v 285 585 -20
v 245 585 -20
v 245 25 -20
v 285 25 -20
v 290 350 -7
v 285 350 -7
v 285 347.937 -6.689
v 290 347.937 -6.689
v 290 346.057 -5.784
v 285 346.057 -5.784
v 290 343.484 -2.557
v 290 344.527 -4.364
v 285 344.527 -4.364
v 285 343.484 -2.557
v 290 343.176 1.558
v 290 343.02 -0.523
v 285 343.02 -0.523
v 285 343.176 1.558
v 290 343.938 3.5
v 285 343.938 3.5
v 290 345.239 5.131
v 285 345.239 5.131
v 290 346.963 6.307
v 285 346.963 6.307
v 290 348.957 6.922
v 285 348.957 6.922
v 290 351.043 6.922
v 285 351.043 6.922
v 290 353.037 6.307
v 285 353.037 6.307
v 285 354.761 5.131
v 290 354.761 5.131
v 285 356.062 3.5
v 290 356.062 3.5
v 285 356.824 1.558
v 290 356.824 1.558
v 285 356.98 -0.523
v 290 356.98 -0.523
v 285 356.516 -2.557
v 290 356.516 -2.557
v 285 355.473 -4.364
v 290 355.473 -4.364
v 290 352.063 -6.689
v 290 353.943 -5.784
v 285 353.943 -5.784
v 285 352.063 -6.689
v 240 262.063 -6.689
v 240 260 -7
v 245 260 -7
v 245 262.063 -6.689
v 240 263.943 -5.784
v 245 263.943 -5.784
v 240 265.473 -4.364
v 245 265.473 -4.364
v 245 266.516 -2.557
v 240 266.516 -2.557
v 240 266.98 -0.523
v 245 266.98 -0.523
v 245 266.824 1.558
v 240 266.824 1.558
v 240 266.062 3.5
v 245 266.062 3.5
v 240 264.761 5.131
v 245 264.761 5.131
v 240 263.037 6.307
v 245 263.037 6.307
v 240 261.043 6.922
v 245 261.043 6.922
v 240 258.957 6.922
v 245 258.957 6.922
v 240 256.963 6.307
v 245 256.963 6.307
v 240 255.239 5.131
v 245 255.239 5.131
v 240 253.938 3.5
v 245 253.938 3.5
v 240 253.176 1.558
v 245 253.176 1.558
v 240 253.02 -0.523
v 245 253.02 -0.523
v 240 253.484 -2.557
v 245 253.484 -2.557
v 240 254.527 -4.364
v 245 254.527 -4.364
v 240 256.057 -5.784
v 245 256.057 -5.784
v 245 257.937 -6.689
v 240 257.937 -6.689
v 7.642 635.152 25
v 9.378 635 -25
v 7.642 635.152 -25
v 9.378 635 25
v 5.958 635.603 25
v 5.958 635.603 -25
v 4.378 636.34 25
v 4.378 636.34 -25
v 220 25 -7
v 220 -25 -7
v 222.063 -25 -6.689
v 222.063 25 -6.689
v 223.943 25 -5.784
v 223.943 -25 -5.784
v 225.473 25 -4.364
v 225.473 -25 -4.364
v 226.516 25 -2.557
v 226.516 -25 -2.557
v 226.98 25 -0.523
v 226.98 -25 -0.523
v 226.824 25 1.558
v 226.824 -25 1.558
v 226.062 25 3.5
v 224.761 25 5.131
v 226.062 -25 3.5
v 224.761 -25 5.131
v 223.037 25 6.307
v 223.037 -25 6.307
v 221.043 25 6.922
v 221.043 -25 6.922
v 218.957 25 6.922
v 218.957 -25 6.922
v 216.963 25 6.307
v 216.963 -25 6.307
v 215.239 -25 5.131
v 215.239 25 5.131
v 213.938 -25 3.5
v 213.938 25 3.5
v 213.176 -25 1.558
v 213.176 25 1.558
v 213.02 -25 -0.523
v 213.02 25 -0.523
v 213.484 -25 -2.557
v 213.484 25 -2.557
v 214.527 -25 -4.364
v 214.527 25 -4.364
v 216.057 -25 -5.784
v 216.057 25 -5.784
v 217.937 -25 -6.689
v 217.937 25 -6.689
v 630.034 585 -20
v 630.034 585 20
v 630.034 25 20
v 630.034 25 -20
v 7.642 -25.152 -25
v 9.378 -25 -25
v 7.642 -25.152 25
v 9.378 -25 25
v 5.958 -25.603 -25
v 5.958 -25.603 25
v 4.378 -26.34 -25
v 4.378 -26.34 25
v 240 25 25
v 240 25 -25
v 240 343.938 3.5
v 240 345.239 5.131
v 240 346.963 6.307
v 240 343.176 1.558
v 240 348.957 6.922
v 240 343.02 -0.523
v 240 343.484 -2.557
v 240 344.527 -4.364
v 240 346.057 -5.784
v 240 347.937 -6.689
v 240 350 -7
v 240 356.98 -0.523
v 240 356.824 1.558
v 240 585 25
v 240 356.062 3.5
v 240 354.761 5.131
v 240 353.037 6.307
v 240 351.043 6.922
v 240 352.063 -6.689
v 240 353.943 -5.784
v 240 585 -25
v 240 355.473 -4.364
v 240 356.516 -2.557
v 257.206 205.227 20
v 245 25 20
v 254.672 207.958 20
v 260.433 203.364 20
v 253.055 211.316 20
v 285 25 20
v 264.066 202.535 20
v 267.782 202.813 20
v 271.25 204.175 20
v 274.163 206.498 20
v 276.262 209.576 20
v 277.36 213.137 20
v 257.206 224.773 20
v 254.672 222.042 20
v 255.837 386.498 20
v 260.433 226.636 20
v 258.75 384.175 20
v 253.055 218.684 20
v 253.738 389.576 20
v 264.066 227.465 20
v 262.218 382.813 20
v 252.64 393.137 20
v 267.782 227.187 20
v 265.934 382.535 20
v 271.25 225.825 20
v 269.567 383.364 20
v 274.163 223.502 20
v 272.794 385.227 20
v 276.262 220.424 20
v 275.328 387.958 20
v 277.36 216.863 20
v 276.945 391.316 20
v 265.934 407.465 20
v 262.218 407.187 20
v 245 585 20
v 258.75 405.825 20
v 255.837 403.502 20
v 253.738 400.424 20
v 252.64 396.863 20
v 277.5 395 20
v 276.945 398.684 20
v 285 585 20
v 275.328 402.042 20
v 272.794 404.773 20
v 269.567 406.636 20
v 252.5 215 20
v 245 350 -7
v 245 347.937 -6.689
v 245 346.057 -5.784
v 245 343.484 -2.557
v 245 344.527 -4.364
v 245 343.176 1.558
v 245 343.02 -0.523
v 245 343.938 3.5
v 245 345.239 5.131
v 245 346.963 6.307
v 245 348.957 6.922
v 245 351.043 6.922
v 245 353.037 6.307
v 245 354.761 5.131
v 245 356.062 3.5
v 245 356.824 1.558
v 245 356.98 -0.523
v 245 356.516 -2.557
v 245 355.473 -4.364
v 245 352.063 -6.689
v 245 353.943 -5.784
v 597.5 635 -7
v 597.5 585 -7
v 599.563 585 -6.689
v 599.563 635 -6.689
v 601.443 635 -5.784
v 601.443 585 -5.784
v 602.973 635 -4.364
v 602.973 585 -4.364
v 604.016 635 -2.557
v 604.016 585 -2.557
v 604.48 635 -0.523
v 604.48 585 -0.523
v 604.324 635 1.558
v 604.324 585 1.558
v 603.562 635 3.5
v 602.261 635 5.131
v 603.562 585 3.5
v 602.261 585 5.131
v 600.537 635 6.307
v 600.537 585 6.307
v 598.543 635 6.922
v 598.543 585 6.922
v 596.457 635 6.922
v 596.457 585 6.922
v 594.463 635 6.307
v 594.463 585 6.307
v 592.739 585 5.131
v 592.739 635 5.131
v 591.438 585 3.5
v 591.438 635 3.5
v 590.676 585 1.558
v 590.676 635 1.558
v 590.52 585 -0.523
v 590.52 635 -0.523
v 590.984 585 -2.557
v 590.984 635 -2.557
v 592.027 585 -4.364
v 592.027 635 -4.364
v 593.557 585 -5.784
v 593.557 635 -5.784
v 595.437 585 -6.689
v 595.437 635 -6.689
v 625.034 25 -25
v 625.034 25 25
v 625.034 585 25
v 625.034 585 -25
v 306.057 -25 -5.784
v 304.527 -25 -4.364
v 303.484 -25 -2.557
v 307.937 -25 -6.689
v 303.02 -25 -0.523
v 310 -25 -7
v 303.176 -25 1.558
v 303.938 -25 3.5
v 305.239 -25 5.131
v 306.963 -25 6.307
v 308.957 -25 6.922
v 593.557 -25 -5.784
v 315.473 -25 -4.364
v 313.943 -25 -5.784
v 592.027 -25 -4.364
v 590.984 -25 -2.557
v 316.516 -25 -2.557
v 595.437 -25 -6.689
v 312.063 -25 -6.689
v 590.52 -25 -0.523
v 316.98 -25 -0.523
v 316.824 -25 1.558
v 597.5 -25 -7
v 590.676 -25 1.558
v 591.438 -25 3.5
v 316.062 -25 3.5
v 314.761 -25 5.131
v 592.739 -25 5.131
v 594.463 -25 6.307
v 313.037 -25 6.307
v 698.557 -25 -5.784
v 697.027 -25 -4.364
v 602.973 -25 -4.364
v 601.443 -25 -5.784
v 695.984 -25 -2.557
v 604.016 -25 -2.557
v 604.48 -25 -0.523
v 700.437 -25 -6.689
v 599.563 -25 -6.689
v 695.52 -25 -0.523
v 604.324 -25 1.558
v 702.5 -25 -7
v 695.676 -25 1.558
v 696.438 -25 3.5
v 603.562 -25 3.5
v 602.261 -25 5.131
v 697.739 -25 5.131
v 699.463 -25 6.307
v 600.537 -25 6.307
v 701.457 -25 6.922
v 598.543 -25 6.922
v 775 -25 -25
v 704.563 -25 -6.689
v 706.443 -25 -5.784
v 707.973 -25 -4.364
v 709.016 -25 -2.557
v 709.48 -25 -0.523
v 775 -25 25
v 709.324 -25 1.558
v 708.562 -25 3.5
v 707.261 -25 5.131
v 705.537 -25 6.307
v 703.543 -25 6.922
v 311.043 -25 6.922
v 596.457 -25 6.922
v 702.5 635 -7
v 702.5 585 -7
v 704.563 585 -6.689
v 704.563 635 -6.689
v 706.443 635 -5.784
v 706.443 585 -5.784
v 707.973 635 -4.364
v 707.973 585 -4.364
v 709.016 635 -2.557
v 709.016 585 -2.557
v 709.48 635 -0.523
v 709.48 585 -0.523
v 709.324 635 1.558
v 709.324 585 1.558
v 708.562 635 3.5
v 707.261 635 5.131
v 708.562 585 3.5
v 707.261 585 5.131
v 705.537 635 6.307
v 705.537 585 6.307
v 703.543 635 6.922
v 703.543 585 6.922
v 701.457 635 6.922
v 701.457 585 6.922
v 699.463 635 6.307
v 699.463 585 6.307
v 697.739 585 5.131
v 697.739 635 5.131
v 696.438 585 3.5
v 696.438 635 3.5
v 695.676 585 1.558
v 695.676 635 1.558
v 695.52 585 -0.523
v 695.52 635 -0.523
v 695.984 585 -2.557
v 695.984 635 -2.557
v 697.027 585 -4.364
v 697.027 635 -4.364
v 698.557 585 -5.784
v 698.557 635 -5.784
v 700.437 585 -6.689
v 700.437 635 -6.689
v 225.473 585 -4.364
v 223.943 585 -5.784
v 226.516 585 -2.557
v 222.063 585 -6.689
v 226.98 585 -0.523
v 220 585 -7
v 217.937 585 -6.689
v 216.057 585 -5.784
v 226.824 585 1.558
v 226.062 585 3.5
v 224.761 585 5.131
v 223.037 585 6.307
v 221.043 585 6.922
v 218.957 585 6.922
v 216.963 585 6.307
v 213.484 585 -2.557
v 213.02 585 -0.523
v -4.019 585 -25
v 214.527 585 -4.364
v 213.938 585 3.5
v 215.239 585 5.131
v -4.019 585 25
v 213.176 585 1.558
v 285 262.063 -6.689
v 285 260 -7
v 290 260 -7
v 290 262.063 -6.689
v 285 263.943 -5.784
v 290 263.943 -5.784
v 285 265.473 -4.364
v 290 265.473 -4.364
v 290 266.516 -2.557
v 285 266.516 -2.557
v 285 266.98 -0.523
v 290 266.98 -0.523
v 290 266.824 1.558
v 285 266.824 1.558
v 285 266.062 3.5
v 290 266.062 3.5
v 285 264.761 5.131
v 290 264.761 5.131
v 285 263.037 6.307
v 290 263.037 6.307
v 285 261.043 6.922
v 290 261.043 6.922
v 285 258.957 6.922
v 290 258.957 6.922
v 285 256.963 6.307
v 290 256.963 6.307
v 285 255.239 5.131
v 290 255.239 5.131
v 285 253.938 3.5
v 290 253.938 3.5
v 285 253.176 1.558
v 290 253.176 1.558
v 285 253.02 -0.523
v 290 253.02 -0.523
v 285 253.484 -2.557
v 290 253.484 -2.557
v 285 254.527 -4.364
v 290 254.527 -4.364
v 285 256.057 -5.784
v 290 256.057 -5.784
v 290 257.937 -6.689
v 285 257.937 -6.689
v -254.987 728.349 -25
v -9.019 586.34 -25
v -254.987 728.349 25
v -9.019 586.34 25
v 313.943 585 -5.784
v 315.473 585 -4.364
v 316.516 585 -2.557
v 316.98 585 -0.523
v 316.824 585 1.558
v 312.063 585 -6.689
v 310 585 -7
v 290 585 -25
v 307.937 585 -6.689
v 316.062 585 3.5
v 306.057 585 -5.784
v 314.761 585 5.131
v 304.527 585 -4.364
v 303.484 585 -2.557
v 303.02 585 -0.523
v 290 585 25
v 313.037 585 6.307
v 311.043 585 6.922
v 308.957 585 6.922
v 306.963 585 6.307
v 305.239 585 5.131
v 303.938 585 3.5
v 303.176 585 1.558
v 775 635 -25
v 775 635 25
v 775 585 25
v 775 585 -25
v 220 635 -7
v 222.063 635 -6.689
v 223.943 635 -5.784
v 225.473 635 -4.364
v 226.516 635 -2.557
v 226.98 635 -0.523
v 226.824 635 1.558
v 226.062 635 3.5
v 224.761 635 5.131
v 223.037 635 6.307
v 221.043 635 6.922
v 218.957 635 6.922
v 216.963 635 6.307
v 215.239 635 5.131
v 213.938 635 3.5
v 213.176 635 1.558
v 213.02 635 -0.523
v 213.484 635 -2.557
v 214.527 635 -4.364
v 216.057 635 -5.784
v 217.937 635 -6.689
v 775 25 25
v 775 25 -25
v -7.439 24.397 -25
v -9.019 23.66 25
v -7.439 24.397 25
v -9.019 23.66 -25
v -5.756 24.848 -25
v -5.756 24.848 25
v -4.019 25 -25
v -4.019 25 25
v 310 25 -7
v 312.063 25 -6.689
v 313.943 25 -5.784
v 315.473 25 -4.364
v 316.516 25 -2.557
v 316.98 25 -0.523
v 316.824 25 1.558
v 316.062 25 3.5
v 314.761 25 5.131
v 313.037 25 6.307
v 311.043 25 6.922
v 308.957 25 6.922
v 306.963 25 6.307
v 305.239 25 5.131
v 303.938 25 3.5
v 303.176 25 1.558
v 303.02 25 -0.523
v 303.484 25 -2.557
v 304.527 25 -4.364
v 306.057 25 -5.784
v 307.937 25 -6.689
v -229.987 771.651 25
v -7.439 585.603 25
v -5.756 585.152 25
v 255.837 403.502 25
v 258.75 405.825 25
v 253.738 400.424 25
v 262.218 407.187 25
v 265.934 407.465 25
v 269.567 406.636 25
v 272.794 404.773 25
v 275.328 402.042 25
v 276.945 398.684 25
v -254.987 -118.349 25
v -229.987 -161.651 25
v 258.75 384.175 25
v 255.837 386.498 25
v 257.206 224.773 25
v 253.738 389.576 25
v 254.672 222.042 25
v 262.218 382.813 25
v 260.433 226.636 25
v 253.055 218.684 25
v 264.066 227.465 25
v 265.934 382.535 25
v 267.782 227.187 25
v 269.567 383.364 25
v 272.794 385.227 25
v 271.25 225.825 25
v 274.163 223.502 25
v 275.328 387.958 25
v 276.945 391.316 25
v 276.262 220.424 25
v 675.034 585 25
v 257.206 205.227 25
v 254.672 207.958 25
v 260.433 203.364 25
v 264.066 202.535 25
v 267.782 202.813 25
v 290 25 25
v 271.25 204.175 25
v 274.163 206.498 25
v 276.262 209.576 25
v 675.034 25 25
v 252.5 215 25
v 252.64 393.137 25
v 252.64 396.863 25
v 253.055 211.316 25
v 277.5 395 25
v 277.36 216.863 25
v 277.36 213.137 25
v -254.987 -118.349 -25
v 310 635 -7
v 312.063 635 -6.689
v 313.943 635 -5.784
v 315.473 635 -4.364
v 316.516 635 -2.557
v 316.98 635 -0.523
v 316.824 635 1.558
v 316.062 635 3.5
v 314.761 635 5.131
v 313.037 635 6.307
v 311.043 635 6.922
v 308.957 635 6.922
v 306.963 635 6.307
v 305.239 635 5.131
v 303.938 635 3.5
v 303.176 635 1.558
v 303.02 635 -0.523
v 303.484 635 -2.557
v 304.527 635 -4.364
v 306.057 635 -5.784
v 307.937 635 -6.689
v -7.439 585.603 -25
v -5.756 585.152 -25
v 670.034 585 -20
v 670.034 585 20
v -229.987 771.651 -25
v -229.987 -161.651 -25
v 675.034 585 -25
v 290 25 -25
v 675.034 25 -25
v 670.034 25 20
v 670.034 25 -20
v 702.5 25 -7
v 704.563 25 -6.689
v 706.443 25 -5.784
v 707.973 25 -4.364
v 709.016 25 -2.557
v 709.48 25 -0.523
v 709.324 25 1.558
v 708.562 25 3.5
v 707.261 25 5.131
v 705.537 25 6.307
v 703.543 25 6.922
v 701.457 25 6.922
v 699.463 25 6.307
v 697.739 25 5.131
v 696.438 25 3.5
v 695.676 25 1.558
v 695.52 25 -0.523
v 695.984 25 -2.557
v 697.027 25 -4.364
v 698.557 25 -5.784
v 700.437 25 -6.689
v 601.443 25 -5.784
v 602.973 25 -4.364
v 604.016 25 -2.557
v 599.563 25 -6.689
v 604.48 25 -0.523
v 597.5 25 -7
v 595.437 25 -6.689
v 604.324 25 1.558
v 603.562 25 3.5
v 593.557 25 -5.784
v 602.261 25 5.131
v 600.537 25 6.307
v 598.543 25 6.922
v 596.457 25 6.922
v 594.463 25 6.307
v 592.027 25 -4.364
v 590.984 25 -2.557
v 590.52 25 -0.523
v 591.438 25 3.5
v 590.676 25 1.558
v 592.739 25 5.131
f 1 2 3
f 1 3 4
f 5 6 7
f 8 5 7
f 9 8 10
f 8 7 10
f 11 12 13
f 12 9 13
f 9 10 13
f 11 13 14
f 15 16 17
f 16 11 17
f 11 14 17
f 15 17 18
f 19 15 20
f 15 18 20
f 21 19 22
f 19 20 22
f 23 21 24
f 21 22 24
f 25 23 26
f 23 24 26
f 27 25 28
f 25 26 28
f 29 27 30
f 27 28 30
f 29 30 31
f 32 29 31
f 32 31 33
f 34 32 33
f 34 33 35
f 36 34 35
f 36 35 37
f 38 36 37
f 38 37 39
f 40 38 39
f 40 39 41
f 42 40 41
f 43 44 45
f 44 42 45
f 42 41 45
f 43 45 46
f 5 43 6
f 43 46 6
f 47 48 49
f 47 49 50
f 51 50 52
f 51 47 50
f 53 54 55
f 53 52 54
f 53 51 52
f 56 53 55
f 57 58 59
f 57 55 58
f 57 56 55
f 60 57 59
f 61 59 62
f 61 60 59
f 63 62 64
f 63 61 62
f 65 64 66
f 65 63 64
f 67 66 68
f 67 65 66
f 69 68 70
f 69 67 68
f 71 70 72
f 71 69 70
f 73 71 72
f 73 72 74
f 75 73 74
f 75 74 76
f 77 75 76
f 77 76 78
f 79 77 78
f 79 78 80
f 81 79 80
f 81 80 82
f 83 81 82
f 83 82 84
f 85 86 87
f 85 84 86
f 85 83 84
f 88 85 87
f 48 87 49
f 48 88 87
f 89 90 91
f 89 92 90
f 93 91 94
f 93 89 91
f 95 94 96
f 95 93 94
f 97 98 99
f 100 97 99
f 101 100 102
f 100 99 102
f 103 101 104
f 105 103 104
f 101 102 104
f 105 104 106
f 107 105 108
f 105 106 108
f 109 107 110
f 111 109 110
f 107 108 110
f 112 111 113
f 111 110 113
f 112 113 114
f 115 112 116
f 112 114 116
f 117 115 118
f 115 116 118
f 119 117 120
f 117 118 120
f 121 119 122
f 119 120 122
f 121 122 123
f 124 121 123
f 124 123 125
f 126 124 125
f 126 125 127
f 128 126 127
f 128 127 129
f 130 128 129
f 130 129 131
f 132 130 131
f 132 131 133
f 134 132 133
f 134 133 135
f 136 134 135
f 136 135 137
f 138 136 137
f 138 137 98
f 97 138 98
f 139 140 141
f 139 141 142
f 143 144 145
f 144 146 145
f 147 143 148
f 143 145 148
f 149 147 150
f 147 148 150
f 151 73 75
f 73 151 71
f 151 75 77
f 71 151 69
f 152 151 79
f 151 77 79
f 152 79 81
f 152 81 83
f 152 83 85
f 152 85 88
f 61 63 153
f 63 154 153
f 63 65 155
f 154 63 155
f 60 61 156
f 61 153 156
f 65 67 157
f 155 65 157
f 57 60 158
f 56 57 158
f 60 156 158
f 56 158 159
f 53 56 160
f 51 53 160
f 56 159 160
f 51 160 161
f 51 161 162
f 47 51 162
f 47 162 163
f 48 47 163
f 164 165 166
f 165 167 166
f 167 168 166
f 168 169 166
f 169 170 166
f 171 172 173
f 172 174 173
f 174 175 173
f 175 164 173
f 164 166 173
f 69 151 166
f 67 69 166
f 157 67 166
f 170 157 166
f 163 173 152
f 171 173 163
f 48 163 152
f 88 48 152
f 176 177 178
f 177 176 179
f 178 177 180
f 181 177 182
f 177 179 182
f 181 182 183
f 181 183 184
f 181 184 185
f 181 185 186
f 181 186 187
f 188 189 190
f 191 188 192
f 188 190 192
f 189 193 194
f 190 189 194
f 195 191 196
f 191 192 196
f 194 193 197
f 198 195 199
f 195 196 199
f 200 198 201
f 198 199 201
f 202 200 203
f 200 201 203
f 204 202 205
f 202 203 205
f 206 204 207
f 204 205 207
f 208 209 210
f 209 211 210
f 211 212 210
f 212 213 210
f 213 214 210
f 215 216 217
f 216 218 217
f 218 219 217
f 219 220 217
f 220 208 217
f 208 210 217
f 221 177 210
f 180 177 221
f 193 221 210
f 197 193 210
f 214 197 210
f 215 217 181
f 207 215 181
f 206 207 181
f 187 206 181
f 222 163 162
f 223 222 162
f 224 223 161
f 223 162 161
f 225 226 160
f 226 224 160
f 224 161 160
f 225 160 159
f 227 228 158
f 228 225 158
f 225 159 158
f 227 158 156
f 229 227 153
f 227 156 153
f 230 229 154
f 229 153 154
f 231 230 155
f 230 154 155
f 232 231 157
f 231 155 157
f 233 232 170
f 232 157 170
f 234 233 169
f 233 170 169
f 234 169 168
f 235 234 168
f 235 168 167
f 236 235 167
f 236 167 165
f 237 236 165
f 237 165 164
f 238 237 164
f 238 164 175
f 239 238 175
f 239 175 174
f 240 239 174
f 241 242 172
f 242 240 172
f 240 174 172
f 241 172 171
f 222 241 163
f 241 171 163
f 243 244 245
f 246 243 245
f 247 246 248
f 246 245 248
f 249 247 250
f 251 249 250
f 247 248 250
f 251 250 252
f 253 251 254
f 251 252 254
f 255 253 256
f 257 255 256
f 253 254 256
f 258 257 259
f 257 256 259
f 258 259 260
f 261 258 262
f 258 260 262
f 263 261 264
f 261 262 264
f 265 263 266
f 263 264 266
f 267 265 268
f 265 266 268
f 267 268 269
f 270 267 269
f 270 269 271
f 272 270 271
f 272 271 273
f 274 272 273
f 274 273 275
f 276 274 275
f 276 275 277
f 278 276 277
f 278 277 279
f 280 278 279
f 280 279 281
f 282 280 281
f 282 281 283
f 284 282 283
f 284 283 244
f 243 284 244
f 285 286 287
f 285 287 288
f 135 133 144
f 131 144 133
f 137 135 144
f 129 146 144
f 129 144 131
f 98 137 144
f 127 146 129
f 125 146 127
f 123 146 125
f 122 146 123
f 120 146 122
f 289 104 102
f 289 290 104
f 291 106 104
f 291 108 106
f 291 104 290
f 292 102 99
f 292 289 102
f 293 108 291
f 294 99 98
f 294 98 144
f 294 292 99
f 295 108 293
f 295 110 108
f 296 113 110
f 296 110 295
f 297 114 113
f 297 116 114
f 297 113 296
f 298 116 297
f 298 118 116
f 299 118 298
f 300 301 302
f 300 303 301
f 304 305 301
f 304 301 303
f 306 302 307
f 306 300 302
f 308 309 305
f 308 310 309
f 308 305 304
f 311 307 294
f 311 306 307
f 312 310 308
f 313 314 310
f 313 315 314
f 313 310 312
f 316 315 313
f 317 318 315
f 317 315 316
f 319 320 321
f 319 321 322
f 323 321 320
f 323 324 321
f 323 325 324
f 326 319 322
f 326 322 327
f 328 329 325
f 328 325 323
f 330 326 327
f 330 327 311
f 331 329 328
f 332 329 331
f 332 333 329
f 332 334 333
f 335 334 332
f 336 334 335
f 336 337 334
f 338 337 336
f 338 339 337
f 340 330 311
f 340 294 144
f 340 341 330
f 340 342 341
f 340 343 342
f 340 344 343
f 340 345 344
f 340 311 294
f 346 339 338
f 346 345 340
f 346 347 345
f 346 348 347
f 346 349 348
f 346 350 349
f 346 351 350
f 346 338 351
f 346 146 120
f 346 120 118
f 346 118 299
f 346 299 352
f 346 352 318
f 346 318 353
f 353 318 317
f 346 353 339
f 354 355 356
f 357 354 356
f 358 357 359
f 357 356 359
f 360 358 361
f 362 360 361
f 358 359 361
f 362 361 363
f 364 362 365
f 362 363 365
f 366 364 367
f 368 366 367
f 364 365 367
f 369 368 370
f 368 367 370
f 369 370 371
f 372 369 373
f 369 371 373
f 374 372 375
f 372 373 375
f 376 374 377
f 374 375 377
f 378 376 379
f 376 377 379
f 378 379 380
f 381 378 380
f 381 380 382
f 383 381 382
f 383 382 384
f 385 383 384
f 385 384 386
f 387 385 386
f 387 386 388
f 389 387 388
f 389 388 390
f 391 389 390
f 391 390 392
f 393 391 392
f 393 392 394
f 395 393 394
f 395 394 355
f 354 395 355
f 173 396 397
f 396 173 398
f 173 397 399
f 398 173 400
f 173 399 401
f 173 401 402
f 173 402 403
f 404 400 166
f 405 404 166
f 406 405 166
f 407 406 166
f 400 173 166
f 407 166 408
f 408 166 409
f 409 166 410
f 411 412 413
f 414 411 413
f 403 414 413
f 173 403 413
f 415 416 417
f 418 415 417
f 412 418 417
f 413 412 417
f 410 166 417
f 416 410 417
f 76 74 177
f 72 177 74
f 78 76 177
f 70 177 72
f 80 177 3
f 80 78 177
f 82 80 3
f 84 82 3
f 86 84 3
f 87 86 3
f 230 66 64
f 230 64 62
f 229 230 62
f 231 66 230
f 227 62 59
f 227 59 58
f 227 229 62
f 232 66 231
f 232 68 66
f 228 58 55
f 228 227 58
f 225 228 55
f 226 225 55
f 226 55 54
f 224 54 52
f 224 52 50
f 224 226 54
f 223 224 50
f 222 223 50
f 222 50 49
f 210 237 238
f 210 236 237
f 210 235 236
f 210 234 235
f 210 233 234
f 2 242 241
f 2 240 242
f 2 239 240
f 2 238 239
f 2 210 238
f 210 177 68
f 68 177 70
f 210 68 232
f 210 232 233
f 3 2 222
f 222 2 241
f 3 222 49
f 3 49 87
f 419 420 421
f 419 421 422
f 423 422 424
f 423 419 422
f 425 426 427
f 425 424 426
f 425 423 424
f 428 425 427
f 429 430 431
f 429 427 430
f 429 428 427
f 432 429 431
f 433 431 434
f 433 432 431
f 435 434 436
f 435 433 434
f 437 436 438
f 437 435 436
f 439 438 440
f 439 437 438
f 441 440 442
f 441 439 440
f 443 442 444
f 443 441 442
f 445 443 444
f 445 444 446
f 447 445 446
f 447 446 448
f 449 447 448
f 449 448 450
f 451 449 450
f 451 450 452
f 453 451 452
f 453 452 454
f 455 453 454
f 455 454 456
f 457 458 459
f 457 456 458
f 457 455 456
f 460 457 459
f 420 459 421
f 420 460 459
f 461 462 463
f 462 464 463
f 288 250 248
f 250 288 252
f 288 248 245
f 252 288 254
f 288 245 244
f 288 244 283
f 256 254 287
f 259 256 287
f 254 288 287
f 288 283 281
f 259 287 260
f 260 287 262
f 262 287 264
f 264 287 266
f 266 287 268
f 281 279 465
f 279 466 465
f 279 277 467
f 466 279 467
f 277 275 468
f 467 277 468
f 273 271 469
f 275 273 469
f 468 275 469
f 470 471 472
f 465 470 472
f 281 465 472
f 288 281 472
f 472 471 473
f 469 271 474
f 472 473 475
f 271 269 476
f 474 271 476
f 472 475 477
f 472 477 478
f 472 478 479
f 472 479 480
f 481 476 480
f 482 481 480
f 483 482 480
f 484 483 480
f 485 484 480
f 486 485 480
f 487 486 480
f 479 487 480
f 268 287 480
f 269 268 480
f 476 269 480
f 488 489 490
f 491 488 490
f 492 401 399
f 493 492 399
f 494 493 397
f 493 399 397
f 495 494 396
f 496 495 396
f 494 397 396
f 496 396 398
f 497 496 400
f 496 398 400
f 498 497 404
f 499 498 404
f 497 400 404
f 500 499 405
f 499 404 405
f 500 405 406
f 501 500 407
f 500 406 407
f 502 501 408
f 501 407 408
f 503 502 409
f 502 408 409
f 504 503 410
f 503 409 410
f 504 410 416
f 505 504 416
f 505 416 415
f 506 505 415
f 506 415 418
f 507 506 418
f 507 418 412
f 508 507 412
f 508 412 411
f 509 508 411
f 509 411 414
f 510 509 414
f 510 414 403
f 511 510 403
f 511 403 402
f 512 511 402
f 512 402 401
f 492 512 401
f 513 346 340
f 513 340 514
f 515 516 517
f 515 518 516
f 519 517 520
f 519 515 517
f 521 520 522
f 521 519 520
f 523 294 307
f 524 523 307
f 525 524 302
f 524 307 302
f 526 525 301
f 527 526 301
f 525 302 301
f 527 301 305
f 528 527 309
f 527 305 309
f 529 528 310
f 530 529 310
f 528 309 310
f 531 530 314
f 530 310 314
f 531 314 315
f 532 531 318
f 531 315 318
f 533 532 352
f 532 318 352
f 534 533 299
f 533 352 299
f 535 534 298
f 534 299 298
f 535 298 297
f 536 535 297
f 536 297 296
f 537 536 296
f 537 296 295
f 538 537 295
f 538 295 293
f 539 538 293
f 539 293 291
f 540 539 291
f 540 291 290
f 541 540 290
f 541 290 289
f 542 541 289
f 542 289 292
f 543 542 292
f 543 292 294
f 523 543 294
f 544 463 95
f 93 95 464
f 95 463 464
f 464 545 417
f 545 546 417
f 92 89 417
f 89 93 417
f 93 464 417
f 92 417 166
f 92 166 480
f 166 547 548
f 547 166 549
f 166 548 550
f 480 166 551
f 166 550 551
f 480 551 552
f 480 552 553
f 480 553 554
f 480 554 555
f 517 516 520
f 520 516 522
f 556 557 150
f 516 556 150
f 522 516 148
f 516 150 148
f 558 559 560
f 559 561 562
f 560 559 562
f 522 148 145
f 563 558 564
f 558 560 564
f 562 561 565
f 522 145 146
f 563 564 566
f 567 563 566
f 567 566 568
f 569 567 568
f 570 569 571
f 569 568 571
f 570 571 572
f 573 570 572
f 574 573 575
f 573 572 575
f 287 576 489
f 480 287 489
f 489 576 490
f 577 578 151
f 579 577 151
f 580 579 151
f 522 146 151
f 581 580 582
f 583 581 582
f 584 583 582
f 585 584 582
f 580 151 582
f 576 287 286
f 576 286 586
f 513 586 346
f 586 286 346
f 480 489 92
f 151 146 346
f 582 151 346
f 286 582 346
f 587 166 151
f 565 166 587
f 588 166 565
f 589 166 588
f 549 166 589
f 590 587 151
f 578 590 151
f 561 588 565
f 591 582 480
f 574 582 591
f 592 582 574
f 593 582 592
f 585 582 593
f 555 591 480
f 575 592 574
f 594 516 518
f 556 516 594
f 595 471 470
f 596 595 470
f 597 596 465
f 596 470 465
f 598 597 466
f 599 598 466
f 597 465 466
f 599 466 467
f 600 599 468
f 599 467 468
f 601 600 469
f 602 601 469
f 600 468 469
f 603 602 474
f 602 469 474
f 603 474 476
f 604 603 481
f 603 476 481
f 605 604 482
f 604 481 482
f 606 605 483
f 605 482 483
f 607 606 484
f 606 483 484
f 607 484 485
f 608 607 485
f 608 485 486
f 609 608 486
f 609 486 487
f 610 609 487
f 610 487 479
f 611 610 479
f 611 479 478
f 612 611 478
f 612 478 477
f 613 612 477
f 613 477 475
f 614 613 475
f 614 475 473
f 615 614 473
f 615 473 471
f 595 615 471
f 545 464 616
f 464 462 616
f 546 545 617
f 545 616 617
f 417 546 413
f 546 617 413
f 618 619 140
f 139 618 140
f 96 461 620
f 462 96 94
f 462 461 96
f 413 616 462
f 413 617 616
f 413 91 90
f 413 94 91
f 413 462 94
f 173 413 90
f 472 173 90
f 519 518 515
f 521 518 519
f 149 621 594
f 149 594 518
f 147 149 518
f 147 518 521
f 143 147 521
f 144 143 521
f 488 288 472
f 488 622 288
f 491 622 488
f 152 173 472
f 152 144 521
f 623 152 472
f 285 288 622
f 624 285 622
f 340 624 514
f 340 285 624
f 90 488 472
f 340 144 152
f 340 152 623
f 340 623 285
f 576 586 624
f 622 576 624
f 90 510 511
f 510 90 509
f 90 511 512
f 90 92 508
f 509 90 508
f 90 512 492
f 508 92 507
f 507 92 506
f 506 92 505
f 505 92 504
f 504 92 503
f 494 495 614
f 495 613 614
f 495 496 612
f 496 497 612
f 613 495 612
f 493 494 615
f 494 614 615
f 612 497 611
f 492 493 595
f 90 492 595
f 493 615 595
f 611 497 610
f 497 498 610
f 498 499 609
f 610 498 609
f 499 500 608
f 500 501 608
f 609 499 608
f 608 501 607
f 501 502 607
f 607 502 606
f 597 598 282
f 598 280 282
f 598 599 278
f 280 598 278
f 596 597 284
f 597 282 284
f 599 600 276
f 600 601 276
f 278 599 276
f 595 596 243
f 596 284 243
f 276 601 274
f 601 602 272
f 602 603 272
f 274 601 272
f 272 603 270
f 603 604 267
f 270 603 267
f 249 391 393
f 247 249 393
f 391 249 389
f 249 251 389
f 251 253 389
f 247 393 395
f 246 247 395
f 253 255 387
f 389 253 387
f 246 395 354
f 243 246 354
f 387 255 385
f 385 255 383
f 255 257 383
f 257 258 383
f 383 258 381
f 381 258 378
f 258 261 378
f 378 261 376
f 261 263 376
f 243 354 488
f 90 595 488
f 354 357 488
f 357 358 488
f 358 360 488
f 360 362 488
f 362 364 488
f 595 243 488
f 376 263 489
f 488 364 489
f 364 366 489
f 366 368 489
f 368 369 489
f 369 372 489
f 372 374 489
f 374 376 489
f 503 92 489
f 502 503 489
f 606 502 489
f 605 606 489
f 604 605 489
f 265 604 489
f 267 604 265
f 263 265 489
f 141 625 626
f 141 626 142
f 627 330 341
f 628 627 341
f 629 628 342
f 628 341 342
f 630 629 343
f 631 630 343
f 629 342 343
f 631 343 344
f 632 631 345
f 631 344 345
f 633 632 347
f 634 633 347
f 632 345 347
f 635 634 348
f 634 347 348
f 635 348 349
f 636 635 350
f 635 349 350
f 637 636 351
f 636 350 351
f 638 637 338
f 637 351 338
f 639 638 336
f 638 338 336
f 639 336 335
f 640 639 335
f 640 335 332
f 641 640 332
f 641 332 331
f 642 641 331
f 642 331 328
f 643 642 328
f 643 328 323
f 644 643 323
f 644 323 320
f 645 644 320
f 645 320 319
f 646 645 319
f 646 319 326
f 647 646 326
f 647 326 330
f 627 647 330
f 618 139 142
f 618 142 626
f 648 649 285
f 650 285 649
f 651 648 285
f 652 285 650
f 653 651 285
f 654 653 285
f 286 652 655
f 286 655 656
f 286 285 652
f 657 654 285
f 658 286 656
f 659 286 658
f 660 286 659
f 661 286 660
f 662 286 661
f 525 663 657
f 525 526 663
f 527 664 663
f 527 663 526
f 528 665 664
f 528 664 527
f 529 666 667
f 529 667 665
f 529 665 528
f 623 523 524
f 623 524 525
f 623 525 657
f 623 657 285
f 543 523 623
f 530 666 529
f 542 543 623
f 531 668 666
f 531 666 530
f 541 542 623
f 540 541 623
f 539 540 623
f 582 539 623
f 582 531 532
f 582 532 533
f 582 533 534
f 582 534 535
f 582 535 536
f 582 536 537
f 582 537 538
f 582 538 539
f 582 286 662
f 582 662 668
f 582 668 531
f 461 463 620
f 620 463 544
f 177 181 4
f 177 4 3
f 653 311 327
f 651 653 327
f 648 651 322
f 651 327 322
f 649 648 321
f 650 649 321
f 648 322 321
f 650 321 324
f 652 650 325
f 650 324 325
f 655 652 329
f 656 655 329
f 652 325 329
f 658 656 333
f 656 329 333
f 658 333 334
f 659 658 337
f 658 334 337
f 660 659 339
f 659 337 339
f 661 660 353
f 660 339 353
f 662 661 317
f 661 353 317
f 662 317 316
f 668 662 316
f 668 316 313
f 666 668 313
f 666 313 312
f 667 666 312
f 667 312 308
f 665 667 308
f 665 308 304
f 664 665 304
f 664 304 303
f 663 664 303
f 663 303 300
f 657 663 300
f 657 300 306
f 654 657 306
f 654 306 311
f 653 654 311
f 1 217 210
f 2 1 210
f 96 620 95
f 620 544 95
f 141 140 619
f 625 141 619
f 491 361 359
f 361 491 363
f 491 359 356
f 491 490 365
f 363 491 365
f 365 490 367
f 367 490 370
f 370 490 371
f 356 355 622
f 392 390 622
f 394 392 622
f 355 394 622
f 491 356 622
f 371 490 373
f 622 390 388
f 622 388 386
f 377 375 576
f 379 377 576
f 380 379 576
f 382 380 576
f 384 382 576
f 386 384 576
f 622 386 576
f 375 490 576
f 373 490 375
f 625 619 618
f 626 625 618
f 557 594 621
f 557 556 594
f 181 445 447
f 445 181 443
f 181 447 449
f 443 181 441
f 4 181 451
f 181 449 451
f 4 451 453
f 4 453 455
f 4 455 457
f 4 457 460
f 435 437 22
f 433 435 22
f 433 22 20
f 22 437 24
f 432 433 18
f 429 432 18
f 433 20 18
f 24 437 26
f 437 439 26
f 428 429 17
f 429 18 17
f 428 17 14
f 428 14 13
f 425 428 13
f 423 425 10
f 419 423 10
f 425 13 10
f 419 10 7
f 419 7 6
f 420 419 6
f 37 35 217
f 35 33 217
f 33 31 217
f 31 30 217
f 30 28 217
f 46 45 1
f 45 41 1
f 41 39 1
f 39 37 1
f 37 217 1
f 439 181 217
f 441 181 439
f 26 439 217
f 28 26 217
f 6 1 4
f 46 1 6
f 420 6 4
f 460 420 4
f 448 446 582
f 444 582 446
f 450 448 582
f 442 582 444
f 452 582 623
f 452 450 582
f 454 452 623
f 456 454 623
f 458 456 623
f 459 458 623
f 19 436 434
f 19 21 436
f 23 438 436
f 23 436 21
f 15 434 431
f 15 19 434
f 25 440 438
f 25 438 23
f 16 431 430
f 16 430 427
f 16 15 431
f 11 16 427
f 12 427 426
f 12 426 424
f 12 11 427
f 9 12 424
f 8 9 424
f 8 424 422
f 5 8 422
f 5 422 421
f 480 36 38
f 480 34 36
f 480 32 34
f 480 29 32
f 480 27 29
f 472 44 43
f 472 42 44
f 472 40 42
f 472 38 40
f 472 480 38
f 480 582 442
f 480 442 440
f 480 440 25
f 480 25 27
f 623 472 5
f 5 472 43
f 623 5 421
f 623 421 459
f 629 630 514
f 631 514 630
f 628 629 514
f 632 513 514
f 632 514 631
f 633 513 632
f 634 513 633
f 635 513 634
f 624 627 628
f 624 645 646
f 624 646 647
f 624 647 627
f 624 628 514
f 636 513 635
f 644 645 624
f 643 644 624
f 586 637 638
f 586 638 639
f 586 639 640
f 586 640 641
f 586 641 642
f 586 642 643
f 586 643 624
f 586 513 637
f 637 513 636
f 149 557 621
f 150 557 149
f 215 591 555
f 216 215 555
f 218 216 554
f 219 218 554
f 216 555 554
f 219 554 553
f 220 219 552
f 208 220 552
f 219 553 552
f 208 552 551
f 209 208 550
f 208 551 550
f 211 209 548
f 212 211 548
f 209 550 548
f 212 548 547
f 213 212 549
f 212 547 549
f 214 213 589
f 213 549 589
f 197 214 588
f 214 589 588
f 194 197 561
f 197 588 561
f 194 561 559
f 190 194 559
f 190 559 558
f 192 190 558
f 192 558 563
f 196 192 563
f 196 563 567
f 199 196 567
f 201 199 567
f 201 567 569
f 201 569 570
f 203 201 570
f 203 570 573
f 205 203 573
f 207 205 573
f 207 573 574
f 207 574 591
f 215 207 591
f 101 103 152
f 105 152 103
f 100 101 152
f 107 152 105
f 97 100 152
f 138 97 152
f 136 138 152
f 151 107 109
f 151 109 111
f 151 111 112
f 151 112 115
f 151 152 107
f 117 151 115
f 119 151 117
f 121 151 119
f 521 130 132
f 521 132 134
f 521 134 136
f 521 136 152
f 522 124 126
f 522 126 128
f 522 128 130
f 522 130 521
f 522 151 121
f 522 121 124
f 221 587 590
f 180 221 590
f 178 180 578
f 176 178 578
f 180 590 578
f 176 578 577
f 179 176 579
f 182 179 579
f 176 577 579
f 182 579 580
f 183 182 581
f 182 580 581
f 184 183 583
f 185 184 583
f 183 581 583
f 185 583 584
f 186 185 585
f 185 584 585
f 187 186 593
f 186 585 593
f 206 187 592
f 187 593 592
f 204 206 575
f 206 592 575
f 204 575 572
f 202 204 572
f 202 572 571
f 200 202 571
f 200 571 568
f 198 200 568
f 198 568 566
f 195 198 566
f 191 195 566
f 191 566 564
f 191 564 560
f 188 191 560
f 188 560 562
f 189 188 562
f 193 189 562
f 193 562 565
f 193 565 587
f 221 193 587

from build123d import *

# Parameters (mm, degrees)
SKETCH1_W               = 385
SKETCH1_H               = 25
SKETCH1_W_2             = 125
BOSS_EXTRUDE4_DEPTH     = 25
FILLET1_R               = 10
FILLET2_R               = 10
SKETCH8_W               = 50
SKETCH8_H               = 50
SKETCH8_W_2             = 40
SKETCH8_H_2             = 40
BOSS_EXTRUDE5_DEPTH     = 280
CUT_EXTRUDE2_DEPTH      = 51
CUT_EXTRUDE2_DEPTH_BACK = 626.028762059
SKETCH11_R              = 7
SKETCH12_R              = 7
CUT_EXTRUDE3_DEPTH      = 1112.711398879
SKETCH13_R              = 12.5
CUT_EXTRUDE4_DEPTH      = 25


with BuildPart() as part:
    # Sketch1 → Boss-Extrude4 (new, symmetric)
    with BuildSketch(Plane.XY):
        Polygon((-254.98711306, -118.349364905), (-242.48711306, -140), (0, 0), (265, 0), (265, 25), (-6.698729811, 25), align=None)
        Polygon((0, 0), (-242.48711306, -140), (-229.98711306, -161.650635095), (6.698729811, -25), (775, -25), (775, 0), (650, 0), (265, 0), align=None)
        with Locations((457.5, 12.5)):
            Rectangle(SKETCH1_W, SKETCH1_H)
        with Locations((712.5, 12.5)):
            Rectangle(SKETCH1_W_2, SKETCH1_H)
    extrude(amount=BOSS_EXTRUDE4_DEPTH, both=True)

    # Fillet1
    fillet1_edges = [part.edges().sort_by_distance(p)[0] for p in [
        (-6.698729811, 25, 0),
    ]]
    fillet(fillet1_edges, radius=FILLET1_R)

    # Fillet2
    fillet2_edges = [part.edges().sort_by_distance(p)[0] for p in [
        (6.698729811, -25, 0),
    ]]
    fillet(fillet2_edges, radius=FILLET2_R)

    # Sketch8 → Boss-Extrude5 (add)
    # profile 1 of 2: a face of its own
    with BuildSketch(Plane(origin=(0, 25, 0), x_dir=(1, 0, 0), z_dir=(0, 1, 0))):
        with Locations((265, 0)):
            Rectangle(SKETCH8_W, SKETCH8_H)
        with Locations((265, 0)):
            Rectangle(SKETCH8_W_2, SKETCH8_H_2, mode=Mode.SUBTRACT)
    # profile 2 of 2: a face of its own
    with BuildSketch(Plane(origin=(0, 25, 0), x_dir=(1, 0, 0), z_dir=(0, 1, 0))):
        with Locations((650.033558731, 0)):
            Rectangle(SKETCH8_W, SKETCH8_H)
        with Locations((650.033558731, 0)):
            Rectangle(SKETCH8_W_2, SKETCH8_H_2, mode=Mode.SUBTRACT)
    extrude(amount=BOSS_EXTRUDE5_DEPTH)

    # Sketch11 → Cut-Extrude2 (cut, two sides: drawn at the far end of the back side and taken through both)
    with BuildSketch(Plane(origin=(290, 0, 0), x_dir=(0, 0, -1), z_dir=(1, 0, 0)).offset(-CUT_EXTRUDE2_DEPTH_BACK)):
        with Locations((0, 260)):
            Circle(SKETCH11_R)
    extrude(amount=CUT_EXTRUDE2_DEPTH + CUT_EXTRUDE2_DEPTH_BACK, mode=Mode.SUBTRACT)

    # Mirror1: part across plane


with BuildPart() as part_1:
    add(part.part)
    add(part.part.mirror(Plane(origin=(0, 305, 0), x_dir=(0, 0, 1), z_dir=(0, -1, 0))))

    # Sketch12 → Cut-Extrude3 (cut, through all)
    with BuildSketch(Plane.XZ.offset(25)):
        with Locations(Location((310, 0, 0), (0, 0, 270))):
            Circle(SKETCH12_R)
        with Locations(Location((220, 0, 0), (0, 0, 270))):
            Circle(SKETCH12_R)
        with Locations(Location((597.5, 0, 0), (0, 0, 270))):
            Circle(SKETCH12_R)
        with Locations(Location((702.5, 0, 0), (0, 0, 270))):
            Circle(SKETCH12_R)
    extrude(amount=-CUT_EXTRUDE3_DEPTH, mode=Mode.SUBTRACT)

    # Sketch13 → Cut-Extrude4 (cut)
    with BuildSketch(Plane.XY.offset(25)):
        with Locations((265, 395)):
            Circle(SKETCH13_R)
        with Locations(Location((265, 215, 0), (0, 0, 180))):
            Circle(SKETCH13_R)
    extrude(amount=-CUT_EXTRUDE4_DEPTH, mode=Mode.SUBTRACT)


solid = part_1.part
